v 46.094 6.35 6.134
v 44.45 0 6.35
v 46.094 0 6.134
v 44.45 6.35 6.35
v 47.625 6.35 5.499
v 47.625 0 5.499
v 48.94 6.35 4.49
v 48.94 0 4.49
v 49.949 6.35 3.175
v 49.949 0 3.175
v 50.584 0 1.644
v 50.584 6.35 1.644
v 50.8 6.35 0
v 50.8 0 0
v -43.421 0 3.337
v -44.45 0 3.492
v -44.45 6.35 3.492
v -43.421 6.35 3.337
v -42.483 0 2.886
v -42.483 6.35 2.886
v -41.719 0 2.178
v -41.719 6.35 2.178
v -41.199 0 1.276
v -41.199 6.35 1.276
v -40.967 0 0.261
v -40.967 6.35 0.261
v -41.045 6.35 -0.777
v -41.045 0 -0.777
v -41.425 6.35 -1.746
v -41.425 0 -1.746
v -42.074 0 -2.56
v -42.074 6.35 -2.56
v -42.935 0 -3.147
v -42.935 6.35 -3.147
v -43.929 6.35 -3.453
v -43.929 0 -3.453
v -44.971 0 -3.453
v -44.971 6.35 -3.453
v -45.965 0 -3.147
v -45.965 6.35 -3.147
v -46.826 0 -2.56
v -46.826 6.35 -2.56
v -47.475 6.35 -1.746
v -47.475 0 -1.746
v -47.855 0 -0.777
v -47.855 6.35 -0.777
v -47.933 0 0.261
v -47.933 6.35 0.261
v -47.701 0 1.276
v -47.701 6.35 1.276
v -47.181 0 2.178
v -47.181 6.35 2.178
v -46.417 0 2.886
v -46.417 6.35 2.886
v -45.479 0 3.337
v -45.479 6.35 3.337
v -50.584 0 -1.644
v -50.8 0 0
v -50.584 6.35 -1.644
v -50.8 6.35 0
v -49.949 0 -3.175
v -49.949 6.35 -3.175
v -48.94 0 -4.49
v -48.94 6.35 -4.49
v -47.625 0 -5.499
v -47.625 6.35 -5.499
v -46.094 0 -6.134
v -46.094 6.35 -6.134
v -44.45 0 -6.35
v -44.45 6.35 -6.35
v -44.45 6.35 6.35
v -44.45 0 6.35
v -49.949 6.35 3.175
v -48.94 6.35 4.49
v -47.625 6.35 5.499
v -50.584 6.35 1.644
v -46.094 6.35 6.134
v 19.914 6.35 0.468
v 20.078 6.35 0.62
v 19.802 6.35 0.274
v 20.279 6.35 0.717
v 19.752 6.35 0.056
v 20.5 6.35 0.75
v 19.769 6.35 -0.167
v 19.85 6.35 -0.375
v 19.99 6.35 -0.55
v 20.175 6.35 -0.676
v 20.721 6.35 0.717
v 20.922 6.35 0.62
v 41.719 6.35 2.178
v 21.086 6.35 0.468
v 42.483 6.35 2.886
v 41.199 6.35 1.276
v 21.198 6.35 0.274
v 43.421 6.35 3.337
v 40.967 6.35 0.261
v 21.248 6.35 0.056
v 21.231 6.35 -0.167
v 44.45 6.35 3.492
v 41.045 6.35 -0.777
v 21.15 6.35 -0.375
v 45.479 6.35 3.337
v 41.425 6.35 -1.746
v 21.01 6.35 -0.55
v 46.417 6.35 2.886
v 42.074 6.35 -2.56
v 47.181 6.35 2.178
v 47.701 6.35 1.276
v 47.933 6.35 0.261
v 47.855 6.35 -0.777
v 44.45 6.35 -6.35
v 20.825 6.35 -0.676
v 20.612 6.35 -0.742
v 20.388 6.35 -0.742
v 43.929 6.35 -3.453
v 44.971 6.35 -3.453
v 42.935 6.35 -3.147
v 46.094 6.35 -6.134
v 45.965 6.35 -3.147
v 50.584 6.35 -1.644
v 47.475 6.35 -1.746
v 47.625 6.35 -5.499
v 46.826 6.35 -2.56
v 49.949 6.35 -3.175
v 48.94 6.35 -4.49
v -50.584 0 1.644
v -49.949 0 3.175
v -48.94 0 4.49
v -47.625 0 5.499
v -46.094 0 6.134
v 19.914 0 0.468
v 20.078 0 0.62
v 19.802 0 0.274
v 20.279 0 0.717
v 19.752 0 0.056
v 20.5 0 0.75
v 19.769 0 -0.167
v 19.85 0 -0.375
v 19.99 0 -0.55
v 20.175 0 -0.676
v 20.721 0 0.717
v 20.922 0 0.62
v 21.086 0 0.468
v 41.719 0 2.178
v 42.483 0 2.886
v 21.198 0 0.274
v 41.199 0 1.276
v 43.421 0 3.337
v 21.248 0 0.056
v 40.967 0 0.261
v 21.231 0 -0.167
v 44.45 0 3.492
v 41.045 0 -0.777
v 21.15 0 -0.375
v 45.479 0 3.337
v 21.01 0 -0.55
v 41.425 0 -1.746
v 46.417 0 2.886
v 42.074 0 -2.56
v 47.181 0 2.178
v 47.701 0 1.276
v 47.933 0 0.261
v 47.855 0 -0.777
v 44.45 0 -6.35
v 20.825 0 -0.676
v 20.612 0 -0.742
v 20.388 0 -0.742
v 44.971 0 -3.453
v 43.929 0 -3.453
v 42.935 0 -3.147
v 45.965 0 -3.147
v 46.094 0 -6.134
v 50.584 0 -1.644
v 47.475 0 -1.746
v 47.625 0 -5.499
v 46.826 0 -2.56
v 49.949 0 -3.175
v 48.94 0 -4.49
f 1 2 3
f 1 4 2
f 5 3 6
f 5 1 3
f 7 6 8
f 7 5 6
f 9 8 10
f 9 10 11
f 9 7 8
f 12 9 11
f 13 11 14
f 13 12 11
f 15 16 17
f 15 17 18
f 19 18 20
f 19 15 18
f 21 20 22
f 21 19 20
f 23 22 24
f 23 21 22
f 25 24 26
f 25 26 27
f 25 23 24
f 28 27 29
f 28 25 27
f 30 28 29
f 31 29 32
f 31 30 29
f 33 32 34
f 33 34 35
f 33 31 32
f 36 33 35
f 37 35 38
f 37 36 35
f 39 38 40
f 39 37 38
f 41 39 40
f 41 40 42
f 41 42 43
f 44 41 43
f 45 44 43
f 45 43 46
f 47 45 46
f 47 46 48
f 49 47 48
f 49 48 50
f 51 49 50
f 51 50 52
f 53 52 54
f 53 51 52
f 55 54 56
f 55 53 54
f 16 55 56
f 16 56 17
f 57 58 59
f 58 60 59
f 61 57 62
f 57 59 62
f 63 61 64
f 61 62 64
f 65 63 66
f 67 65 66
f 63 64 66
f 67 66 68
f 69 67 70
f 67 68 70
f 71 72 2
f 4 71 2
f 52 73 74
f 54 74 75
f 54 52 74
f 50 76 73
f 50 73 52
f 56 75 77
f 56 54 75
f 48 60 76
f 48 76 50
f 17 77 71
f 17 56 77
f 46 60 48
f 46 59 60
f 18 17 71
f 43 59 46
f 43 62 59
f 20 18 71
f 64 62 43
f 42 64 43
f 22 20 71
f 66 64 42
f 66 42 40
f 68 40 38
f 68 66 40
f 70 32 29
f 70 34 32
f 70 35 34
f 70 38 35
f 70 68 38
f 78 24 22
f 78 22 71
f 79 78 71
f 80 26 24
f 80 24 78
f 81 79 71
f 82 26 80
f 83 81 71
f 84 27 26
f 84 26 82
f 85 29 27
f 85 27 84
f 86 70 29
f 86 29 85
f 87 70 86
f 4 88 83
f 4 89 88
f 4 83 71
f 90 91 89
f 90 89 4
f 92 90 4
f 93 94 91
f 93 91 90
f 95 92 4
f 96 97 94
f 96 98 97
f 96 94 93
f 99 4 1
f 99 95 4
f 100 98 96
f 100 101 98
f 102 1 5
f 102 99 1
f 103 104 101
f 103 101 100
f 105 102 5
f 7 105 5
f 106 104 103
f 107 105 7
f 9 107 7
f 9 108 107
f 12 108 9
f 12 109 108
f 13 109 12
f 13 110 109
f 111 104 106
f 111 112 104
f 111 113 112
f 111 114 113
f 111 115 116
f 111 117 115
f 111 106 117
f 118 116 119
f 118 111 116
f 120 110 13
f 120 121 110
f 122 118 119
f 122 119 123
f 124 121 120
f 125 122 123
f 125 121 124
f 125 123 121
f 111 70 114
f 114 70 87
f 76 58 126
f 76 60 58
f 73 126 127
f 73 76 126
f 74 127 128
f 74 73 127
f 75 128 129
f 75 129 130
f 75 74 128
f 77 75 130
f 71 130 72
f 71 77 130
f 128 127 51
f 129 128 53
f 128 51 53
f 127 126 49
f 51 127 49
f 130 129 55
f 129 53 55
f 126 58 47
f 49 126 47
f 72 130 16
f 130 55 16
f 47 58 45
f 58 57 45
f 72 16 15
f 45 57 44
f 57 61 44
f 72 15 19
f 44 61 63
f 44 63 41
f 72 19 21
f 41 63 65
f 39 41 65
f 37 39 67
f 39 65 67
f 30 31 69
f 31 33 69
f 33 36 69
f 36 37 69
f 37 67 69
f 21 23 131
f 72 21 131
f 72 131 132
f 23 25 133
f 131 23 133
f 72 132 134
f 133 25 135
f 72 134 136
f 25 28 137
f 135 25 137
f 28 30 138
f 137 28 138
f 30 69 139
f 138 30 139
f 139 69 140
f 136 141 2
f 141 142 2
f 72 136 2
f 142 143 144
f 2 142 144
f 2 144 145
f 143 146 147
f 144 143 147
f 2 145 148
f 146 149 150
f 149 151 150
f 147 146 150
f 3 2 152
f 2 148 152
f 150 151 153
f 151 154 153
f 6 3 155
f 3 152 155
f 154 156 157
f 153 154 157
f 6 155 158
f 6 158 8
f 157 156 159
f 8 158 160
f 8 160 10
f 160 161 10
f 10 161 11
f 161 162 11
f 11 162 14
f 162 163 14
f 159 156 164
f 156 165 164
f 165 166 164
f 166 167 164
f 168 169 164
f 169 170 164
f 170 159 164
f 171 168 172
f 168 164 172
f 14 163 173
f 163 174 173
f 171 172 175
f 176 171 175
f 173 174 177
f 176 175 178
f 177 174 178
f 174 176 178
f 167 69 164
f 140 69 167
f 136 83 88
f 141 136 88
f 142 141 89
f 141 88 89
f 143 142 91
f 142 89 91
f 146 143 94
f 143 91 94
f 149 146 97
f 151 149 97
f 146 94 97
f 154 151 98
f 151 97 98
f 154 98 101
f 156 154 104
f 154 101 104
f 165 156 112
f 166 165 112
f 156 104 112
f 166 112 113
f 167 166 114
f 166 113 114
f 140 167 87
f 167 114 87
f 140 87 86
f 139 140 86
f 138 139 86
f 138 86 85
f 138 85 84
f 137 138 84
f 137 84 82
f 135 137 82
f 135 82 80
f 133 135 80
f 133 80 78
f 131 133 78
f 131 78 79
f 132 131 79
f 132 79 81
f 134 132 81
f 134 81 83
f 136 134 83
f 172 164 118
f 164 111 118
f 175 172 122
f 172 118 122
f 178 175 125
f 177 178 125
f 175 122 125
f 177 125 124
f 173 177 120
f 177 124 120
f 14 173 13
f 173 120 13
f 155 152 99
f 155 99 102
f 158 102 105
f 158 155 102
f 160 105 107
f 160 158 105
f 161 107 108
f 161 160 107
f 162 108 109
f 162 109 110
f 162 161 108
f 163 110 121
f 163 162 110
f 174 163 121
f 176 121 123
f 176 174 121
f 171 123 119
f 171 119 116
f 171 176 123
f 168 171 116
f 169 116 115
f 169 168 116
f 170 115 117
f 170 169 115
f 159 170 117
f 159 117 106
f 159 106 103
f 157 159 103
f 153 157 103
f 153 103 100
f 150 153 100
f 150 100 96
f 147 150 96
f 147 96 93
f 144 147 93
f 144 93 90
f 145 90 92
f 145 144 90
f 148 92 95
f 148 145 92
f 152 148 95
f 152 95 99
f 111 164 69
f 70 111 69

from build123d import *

# Parameters (mm, degrees)
SKETCH1_R           = 3.4925
BOSS_EXTRUDE1_DEPTH = 6.35
FILLET1_R           = 6.35
SKETCH3_R           = 0.75
CUT_EXTRUDE1_DEPTH  = 52.587643869


with BuildPart() as part:
    # Sketch1 → Boss-Extrude1 (new body)
    with BuildSketch(Plane(origin=(0, 0, 0), x_dir=(1, 0, 0), z_dir=(0, 1, 0))):
        Polygon((-50.8, 6.35), (-50.8, -6.35), (-6.35, -6.35), (6.35, -6.35), (50.8, -6.35), (50.8, 6.35), (6.35, 6.35), (-6.35, 6.35), align=None)
        with Locations(Location((-44.45, 0, 0), (0, 0, 270))):
            Circle(SKETCH1_R, mode=Mode.SUBTRACT)
        with Locations(Location((44.45, 0, 0), (0, 0, 270))):
            Circle(SKETCH1_R, mode=Mode.SUBTRACT)
    extrude(amount=BOSS_EXTRUDE1_DEPTH)

    # Fillet1
    fillet1_edges = [part.edges().sort_by_distance(p)[0] for p in [
        (50.8, 3.175, -6.35),
        (-50.8, 3.175, -6.35),
        (-50.8, 3.175, 6.35),
        (50.8, 3.175, 6.35),
    ]]
    fillet(fillet1_edges, radius=FILLET1_R - 0.0001)  # a hair under: the kernel refuses the full size

    # Sketch3 → Cut-Extrude1 (cut, through all)
    with BuildSketch(Plane(origin=(0, 6.35, 0), x_dir=(1, 0, 0), z_dir=(0, 1, 0))):
        with Locations(Location((20.5, 0, 0), (0, 0, 270))):
            Circle(SKETCH3_R)
    extrude(amount=-CUT_EXTRUDE1_DEPTH, mode=Mode.SUBTRACT)


solid = part.part
